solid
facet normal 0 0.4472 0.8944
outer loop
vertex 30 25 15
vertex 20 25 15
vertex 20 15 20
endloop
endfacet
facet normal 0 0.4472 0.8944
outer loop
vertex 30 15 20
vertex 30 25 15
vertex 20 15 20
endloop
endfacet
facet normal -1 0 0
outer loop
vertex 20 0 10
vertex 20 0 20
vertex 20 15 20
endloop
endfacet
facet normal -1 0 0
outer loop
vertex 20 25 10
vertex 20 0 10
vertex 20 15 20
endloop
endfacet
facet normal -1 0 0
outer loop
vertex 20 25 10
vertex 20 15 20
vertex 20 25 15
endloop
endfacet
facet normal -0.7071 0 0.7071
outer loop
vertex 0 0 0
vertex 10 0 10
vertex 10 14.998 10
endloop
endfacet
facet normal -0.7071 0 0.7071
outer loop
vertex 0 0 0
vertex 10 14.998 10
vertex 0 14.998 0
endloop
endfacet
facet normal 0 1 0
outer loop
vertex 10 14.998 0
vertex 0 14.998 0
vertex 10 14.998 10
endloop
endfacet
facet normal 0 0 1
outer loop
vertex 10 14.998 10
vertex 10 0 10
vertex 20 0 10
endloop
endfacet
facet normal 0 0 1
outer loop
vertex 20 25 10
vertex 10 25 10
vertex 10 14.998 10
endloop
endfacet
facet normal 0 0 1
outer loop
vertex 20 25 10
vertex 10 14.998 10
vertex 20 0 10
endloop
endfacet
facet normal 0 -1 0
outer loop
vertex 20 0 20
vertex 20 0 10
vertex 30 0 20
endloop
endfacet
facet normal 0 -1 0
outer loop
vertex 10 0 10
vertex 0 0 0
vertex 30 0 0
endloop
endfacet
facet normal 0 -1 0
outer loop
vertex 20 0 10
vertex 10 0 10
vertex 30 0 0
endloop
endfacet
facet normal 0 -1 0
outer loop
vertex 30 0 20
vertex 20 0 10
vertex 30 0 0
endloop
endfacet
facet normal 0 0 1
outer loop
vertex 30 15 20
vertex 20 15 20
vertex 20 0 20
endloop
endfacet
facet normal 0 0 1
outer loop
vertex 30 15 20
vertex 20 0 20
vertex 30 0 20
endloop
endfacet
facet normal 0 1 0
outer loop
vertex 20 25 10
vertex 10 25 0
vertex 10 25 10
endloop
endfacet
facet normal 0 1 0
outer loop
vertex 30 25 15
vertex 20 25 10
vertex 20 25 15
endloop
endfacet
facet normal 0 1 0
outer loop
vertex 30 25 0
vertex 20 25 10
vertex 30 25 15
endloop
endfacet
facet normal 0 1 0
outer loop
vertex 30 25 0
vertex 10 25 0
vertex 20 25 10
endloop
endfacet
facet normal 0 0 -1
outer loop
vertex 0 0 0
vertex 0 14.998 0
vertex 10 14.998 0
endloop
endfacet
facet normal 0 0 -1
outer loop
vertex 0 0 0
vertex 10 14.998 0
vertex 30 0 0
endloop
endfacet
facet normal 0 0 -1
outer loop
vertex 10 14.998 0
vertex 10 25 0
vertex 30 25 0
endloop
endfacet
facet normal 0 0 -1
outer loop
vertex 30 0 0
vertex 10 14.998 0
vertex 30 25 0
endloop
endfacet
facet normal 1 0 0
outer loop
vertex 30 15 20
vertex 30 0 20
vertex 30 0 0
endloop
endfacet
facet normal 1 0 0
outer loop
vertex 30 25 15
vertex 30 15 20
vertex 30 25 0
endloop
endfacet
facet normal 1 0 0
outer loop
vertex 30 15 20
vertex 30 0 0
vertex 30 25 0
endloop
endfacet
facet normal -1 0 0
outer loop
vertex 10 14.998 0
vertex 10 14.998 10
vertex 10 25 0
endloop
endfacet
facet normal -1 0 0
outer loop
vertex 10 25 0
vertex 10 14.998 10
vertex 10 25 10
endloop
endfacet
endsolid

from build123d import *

# Parameters (mm, degrees)
SKETCH1_W           = 30
SKETCH1_H           = 25
BOSS_EXTRUDE1_DEPTH = 20
SKETCH2_W           = 20
SKETCH2_H           = 25
CUT_EXTRUDE1_DEPTH  = 10
CUT_EXTRUDE2_DEPTH  = 20
CUT_EXTRUDE3_DEPTH  = 40
SKETCH5_W           = 10
SKETCH5_H           = 10.001690502
CUT_EXTRUDE4_DEPTH  = 20


with BuildPart() as part:
    # Sketch1 → Boss-Extrude1 (new body)
    with BuildSketch(Plane.XY):
        with Locations((15, 12.5)):
            Rectangle(SKETCH1_W, SKETCH1_H)
    extrude(amount=BOSS_EXTRUDE1_DEPTH)

    # Sketch2 → Cut-Extrude1 (cut)
    with BuildSketch(Plane.XY.offset(20)):
        with Locations((10, 12.5)):
            Rectangle(SKETCH2_W, SKETCH2_H)
    extrude(amount=-CUT_EXTRUDE1_DEPTH, mode=Mode.SUBTRACT)

    # Sketch3 → Cut-Extrude2 (cut)
    with BuildSketch(Plane.ZY.offset(-20)):
        Polygon((15, 25), (20, 15), (20, 25), align=None)
    extrude(amount=-CUT_EXTRUDE2_DEPTH, mode=Mode.SUBTRACT)

    # Sketch4 → Cut-Extrude3 (cut)
    with BuildSketch(Plane(origin=(0, 25, 0), x_dir=(1, 0, 0), z_dir=(0, 1, 0))):
        Polygon((0, -10), (10, -10), (0, 0), align=None)
    extrude(amount=-CUT_EXTRUDE3_DEPTH, mode=Mode.SUBTRACT)

    # Sketch5 → Cut-Extrude4 (cut)
    with BuildSketch(Plane.XY.offset(10)):
        with Locations((5, 19.999154749)):
            Rectangle(SKETCH5_W, SKETCH5_H)
    extrude(amount=-CUT_EXTRUDE4_DEPTH, mode=Mode.SUBTRACT)


solid = part.part
